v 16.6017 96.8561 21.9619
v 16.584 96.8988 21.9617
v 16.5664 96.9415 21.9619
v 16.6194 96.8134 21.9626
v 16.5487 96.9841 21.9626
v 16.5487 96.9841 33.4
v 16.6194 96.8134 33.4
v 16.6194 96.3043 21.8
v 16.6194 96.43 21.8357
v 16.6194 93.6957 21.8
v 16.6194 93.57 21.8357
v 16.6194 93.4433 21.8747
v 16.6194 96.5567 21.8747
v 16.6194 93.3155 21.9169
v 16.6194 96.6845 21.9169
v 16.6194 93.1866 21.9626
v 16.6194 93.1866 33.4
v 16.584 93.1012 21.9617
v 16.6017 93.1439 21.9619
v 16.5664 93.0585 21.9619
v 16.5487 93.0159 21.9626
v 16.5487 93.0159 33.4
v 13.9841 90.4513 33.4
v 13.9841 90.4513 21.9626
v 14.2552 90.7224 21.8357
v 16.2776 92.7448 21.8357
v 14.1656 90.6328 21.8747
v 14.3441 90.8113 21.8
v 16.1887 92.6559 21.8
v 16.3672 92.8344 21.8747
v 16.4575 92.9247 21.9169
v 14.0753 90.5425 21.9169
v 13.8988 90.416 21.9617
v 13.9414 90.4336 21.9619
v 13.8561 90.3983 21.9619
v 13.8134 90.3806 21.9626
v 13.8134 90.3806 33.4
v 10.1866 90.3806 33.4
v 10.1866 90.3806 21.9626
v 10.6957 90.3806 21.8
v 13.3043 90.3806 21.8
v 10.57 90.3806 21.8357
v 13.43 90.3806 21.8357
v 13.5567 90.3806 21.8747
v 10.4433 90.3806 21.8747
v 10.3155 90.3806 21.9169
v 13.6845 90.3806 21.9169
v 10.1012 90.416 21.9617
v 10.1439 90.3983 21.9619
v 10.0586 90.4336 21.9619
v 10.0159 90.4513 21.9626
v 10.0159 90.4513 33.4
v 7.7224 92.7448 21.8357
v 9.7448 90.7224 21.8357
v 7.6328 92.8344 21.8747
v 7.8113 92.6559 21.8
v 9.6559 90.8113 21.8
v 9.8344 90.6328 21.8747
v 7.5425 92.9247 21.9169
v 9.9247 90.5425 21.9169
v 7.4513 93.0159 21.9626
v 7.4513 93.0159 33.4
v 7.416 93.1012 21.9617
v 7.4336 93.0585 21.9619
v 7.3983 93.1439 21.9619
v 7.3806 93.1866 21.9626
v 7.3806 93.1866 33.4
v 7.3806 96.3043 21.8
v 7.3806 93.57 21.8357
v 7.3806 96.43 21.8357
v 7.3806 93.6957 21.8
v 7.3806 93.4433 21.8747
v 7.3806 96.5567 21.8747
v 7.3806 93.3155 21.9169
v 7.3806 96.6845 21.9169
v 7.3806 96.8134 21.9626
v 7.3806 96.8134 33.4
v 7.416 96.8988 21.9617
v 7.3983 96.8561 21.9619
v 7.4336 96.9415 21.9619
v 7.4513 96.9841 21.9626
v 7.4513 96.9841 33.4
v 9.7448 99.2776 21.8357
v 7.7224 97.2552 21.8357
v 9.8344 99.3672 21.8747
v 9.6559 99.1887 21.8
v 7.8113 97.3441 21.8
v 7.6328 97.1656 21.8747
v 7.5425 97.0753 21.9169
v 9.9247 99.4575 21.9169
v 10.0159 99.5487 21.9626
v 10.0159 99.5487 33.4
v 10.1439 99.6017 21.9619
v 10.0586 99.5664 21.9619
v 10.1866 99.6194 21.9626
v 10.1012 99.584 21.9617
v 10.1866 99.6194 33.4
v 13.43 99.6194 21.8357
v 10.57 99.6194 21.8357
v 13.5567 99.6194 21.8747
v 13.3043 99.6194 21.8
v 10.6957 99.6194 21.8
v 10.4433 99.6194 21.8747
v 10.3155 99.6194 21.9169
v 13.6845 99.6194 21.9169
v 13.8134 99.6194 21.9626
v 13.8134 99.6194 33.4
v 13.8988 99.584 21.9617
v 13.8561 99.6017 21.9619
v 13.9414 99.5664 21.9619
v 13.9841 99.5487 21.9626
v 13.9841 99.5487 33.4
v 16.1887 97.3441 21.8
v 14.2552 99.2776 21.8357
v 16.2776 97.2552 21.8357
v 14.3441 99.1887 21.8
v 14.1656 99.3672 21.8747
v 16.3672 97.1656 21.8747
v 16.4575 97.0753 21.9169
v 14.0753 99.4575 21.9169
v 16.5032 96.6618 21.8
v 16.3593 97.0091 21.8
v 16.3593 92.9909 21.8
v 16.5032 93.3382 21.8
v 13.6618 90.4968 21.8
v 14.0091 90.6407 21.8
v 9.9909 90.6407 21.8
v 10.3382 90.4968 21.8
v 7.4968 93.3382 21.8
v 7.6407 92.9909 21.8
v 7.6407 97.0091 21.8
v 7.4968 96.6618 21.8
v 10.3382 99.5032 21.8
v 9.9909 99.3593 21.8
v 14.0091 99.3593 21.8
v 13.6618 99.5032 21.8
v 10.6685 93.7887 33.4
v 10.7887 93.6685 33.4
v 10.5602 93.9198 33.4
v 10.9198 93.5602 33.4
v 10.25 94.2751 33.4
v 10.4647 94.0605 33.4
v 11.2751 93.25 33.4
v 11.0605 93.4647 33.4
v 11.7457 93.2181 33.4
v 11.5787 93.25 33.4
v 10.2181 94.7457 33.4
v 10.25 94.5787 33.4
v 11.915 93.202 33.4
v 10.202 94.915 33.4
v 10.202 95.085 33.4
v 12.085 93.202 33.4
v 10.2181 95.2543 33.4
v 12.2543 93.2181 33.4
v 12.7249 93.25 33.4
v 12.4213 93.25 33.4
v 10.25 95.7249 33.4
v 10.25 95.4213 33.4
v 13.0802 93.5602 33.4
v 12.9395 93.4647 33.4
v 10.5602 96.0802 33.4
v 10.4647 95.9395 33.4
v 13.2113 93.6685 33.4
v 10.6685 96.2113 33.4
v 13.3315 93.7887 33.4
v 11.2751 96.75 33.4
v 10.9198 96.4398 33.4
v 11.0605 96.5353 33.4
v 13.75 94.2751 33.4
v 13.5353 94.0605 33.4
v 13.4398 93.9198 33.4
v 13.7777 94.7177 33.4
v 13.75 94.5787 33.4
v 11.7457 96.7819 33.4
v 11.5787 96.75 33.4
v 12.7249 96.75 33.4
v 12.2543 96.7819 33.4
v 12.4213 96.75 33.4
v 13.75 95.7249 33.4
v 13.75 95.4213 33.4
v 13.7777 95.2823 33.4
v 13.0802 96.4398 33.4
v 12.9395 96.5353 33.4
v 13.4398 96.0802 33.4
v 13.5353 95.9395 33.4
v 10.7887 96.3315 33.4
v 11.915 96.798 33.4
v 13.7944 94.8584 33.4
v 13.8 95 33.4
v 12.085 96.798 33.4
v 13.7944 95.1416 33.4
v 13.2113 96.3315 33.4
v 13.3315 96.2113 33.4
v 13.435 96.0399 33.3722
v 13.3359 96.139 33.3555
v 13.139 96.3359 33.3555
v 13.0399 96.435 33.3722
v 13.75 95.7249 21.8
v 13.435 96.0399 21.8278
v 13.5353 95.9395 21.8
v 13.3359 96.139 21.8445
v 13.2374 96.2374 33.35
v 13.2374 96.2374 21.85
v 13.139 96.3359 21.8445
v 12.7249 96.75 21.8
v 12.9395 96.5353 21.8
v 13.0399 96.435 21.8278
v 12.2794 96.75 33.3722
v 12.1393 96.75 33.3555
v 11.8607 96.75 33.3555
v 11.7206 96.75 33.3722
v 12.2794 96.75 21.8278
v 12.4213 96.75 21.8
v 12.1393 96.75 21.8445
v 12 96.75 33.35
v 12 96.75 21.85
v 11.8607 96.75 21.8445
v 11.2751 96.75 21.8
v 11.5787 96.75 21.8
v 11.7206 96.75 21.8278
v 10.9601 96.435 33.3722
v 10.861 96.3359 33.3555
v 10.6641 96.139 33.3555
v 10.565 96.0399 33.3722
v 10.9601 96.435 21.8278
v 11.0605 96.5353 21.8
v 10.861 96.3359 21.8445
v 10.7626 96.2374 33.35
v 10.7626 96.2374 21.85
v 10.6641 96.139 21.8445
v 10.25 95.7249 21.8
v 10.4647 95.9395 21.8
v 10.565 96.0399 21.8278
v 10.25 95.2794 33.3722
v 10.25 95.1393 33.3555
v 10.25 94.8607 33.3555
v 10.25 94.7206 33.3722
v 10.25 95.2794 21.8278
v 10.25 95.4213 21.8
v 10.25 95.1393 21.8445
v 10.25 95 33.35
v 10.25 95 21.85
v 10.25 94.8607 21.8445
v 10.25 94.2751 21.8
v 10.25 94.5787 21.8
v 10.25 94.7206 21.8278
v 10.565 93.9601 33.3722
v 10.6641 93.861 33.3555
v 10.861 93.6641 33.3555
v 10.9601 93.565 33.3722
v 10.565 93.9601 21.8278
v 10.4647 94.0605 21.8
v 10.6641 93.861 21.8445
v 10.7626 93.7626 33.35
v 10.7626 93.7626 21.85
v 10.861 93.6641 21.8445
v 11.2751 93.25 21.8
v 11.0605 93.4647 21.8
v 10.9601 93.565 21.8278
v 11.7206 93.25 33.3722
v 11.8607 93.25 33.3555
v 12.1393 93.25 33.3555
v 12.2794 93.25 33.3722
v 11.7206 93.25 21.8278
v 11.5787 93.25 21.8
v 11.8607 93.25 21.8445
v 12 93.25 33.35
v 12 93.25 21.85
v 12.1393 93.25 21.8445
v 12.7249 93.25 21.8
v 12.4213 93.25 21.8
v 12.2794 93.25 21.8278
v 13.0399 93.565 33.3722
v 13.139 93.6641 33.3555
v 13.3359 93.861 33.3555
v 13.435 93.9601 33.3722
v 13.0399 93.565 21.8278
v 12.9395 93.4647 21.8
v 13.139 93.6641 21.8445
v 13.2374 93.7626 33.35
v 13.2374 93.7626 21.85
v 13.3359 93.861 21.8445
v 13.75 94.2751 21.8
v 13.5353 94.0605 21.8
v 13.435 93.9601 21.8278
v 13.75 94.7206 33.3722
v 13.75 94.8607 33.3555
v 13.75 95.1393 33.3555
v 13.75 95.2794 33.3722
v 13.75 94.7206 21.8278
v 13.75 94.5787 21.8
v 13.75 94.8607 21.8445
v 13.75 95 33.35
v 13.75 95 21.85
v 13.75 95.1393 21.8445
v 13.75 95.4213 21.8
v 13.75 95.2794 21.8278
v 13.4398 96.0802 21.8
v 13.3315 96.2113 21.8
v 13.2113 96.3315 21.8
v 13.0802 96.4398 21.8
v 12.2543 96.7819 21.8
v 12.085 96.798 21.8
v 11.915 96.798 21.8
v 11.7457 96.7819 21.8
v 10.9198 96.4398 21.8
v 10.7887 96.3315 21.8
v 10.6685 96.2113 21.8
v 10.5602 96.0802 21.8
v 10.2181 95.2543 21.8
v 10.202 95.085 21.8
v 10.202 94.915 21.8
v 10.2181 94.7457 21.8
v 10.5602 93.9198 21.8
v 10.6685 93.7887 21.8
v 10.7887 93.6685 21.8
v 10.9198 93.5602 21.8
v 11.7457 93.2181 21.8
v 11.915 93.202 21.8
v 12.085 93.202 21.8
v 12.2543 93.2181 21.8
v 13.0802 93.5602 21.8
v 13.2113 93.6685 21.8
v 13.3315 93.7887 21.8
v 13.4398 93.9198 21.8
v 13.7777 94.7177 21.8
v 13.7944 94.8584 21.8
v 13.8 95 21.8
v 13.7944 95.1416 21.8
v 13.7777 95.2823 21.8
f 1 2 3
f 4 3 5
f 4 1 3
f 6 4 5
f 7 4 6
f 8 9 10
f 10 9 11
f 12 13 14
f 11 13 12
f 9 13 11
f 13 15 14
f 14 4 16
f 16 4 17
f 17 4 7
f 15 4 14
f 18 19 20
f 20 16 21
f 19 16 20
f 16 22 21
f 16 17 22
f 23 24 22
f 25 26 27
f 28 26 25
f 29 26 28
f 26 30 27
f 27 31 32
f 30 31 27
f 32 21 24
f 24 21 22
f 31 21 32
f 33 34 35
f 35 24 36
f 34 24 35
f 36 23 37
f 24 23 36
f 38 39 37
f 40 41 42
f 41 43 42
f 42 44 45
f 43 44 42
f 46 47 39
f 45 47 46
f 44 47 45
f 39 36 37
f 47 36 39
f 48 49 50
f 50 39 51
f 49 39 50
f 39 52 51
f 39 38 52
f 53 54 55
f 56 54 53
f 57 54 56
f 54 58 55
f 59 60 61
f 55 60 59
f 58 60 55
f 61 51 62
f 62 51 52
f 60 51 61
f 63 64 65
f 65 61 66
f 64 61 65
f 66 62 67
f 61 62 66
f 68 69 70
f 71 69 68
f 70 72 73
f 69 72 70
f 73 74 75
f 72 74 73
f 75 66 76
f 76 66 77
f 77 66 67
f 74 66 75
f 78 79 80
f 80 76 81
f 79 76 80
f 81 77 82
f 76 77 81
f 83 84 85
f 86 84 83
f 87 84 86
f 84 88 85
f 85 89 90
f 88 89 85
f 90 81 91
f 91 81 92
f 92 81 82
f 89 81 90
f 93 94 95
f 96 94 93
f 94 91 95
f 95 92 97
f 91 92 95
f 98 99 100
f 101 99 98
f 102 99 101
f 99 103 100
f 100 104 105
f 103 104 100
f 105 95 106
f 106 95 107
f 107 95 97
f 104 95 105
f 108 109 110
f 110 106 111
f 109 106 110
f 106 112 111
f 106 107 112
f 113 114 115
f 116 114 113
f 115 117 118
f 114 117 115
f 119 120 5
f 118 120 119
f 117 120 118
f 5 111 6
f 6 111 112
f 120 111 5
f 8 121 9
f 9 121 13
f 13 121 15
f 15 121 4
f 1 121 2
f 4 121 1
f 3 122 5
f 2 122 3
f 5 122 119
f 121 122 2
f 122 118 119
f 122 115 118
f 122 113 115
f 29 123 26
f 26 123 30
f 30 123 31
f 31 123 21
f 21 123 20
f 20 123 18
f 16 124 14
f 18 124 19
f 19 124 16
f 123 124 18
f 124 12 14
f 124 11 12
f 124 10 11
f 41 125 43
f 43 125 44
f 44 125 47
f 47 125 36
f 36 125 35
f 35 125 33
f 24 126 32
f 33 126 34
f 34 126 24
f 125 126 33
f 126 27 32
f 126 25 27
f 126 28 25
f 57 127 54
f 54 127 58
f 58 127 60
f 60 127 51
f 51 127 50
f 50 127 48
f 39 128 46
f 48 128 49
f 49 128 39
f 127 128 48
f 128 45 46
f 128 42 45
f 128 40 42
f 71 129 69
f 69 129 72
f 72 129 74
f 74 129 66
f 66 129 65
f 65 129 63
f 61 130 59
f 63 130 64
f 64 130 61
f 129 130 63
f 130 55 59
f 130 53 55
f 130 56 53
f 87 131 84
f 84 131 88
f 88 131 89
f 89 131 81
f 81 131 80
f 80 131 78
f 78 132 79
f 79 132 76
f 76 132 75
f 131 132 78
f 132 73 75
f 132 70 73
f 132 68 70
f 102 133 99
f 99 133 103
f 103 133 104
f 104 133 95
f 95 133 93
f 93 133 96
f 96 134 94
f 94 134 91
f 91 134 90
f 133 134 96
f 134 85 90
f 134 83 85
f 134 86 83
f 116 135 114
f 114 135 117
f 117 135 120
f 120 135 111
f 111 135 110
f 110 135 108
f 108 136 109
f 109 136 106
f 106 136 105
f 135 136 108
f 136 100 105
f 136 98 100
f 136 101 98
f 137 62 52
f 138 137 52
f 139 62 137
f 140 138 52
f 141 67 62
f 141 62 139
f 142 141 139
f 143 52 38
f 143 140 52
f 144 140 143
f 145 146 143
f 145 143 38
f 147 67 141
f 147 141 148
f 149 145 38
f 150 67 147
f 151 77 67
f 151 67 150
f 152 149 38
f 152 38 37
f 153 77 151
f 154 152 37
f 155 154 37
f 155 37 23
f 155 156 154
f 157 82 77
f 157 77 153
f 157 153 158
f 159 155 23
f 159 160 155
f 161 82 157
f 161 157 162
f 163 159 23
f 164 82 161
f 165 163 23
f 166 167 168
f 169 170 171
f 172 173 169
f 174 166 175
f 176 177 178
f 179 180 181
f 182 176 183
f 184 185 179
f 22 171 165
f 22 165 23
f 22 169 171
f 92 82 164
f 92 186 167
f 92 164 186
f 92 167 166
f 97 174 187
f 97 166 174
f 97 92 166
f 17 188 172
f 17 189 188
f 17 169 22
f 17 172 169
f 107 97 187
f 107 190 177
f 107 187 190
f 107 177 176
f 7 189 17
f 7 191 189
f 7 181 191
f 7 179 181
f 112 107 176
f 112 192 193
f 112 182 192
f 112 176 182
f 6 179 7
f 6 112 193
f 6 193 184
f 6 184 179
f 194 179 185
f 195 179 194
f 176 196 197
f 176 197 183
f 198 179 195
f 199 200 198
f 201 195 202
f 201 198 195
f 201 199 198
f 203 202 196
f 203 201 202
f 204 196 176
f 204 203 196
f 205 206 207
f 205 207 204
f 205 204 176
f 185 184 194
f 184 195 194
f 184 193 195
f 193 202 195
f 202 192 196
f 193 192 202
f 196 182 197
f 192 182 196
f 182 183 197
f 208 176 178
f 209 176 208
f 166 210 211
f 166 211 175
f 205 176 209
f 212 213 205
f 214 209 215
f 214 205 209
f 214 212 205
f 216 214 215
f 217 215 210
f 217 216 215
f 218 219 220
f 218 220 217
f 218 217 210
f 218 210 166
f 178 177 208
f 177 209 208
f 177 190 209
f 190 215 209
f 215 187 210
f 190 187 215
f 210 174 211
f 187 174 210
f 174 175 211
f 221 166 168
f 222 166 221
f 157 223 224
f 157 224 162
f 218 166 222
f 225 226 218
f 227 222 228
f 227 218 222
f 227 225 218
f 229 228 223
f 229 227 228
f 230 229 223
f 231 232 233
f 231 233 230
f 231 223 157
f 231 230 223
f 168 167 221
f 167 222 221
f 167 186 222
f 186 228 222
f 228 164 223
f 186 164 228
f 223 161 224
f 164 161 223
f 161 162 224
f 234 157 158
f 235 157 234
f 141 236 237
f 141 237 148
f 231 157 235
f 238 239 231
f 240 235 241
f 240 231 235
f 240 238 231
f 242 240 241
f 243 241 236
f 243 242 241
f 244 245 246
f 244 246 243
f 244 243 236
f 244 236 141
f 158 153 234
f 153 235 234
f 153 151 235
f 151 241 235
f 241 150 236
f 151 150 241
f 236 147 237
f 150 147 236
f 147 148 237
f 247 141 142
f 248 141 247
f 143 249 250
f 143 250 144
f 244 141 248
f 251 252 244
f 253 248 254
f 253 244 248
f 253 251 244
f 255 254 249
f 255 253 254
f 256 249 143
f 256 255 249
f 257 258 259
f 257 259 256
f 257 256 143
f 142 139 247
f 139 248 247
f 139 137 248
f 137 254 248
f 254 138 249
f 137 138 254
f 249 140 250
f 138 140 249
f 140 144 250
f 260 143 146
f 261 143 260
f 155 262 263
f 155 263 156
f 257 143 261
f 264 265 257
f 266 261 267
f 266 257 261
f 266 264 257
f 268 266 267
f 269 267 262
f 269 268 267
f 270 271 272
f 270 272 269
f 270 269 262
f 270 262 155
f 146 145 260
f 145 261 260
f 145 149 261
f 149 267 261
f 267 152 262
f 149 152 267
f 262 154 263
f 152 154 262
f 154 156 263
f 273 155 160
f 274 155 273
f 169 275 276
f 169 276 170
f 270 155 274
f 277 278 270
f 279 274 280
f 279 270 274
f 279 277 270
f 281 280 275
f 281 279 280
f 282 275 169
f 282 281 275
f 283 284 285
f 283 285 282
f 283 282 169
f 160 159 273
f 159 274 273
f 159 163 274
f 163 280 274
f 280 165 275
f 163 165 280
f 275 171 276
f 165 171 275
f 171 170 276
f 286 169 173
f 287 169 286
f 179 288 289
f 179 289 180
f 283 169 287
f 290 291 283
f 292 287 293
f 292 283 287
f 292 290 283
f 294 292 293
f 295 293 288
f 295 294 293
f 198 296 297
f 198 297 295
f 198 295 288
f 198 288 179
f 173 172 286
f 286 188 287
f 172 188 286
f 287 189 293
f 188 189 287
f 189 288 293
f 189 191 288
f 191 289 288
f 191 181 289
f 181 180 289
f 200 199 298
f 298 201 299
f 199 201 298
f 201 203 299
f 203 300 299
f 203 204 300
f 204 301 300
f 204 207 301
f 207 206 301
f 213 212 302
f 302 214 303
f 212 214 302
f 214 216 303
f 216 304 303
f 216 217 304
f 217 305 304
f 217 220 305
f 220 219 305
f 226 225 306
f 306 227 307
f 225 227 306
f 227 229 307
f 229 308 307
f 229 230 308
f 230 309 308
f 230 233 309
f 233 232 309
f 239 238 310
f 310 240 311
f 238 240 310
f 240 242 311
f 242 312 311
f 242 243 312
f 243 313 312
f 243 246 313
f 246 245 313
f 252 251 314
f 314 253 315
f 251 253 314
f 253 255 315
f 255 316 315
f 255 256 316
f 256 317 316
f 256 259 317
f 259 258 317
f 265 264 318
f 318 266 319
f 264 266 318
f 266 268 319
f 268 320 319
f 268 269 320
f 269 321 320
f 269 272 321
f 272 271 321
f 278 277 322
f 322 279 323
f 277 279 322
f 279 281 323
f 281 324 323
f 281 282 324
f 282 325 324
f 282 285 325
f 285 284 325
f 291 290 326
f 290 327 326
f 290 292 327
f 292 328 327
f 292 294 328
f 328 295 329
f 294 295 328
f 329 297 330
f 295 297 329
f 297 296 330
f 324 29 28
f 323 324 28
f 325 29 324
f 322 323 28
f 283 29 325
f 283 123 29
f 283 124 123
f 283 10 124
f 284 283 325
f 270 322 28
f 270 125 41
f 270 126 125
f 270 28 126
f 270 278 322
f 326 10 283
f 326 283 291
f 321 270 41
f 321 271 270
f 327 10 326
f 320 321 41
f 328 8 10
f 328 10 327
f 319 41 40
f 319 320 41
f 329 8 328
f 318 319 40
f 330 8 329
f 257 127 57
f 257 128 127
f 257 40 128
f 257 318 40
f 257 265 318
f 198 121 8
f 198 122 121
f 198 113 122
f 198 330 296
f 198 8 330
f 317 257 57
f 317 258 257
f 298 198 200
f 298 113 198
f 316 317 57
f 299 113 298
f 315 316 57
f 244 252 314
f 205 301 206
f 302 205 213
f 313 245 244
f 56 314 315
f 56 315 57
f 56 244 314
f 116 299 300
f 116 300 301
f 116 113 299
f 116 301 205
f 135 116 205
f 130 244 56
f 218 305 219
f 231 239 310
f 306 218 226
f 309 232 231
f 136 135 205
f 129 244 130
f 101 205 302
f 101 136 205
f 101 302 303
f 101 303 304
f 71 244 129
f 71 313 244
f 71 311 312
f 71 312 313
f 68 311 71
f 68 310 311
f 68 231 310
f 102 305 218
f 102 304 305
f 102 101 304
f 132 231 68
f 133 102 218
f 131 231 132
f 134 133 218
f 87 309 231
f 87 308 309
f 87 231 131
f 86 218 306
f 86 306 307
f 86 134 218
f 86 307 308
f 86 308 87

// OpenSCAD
// Generated by the canonical parent Python sources and validated exchange pipeline.
polyhedron(points=[[16.60171890258789, 96.85609436035156, 21.961946487426758], [16.584041595458984, 96.89877319335938, 21.96173095703125], [16.56636619567871, 96.94145202636719, 21.961946487426758], [16.61939811706543, 96.81341552734375, 21.96259117126465], [16.548686981201172, 96.984130859375, 21.96259117126465], [16.548686981201172, 96.984130859375, 33.400001525878906], [16.61939811706543, 96.81341552734375, 33.400001525878906], [16.61939811706543, 96.30429077148438, 21.799999237060547], [16.61939811706543, 96.43002319335938, 21.83568000793457], [16.61939811706543, 93.69570922851562, 21.799999237060547], [16.61939811706543, 93.56997680664062, 21.83568000793457], [16.61939811706543, 93.44326782226562, 21.874652862548828], [16.61939811706543, 96.55673217773438, 21.874652862548828], [16.61939811706543, 93.31549835205078, 21.916948318481445], [16.61939811706543, 96.68450164794922, 21.916948318481445], [16.61939811706543, 93.18658447265625, 21.96259117126465], [16.61939811706543, 93.18658447265625, 33.400001525878906], [16.584041595458984, 93.10122680664062, 21.96173095703125], [16.60171890258789, 93.14390563964844, 21.961946487426758], [16.56636619567871, 93.05854797363281, 21.961946487426758], [16.548686981201172, 93.015869140625, 21.96259117126465], [16.548686981201172, 93.015869140625, 33.400001525878906], [13.98412799835205, 90.45130920410156, 33.400001525878906], [13.98412799835205, 90.45130920410156, 21.96259117126465], [14.255228996276855, 90.722412109375, 21.83568000793457], [16.277585983276367, 92.7447738647461, 21.83568000793457], [14.165632247924805, 90.63282012939453, 21.874652862548828], [14.344137191772461, 90.81132507324219, 21.799999237060547], [16.188676834106445, 92.6558609008789, 21.799999237060547], [16.3671817779541, 92.83436584472656, 21.874652862548828], [16.457529067993164, 92.92471313476562, 21.916948318481445], [14.075285911560059, 90.54247283935547, 21.916948318481445], [13.898772239685059, 90.41595458984375, 21.96173095703125], [13.941448211669922, 90.43363189697266, 21.961946487426758], [13.856096267700195, 90.39827728271484, 21.961946487426758], [13.813417434692383, 90.38059997558594, 21.96259117126465], [13.813417434692383, 90.38059997558594, 33.400001525878906], [10.186582565307617, 90.38059997558594, 33.400001525878906], [10.186582565307617, 90.38059997558594, 21.96259117126465], [10.69571304321289, 90.38059997558594, 21.799999237060547], [13.30428695678711, 90.38059997558594, 21.799999237060547], [10.569977760314941, 90.38059997558594, 21.83568000793457], [13.430022239685059, 90.38059997558594, 21.83568000793457], [13.556731224060059, 90.38059997558594, 21.874652862548828], [10.443268775939941, 90.38059997558594, 21.874652862548828], [10.315499305725098, 90.38059997558594, 21.916948318481445], [13.684500694274902, 90.38059997558594, 21.916948318481445], [10.101227760314941, 90.41595458984375, 21.96173095703125], [10.143903732299805, 90.39827728271484, 21.961946487426758], [10.058551788330078, 90.43363189697266, 21.961946487426758], [10.01587200164795, 90.45130920410156, 21.96259117126465], [10.01587200164795, 90.45130920410156, 33.400001525878906], [7.722414493560791, 92.7447738647461, 21.83568000793457], [9.744771003723145, 90.722412109375, 21.83568000793457], [7.63281774520874, 92.83436584472656, 21.874652862548828], [7.811322212219238, 92.6558609008789, 21.799999237060547], [9.655862808227539, 90.81132507324219, 21.799999237060547], [9.834367752075195, 90.63282012939453, 21.874652862548828], [7.542470932006836, 92.92471313476562, 21.916948318481445], [9.924714088439941, 90.54247283935547, 21.916948318481445], [7.451313018798828, 93.015869140625, 21.96259117126465], [7.451313018798828, 93.015869140625, 33.400001525878906], [7.415957450866699, 93.10122680664062, 21.96173095703125], [7.4336347579956055, 93.05854797363281, 21.961946487426758], [7.398280620574951, 93.14390563964844, 21.961946487426758], [7.3806023597717285, 93.18658447265625, 21.96259117126465], [7.3806023597717285, 93.18658447265625, 33.400001525878906], [7.3806023597717285, 96.30429077148438, 21.799999237060547], [7.3806023597717285, 93.56997680664062, 21.83568000793457], [7.3806023597717285, 96.43002319335938, 21.83568000793457], [7.3806023597717285, 93.69570922851562, 21.799999237060547], [7.3806023597717285, 93.44326782226562, 21.874652862548828], [7.3806023597717285, 96.55673217773438, 21.874652862548828], [7.3806023597717285, 93.31549835205078, 21.916948318481445], [7.3806023597717285, 96.68450164794922, 21.916948318481445], [7.3806023597717285, 96.81341552734375, 21.96259117126465], [7.3806023597717285, 96.81341552734375, 33.400001525878906], [7.415957450866699, 96.89877319335938, 21.96173095703125], [7.398280620574951, 96.85609436035156, 21.961946487426758], [7.4336347579956055, 96.94145202636719, 21.961946487426758], [7.451313018798828, 96.984130859375, 21.96259117126465], [7.451313018798828, 96.984130859375, 33.400001525878906], [9.744771003723145, 99.277587890625, 21.83568000793457], [7.722414493560791, 97.2552261352539, 21.83568000793457], [9.834367752075195, 99.36717987060547, 21.874652862548828], [9.655862808227539, 99.18867492675781, 21.799999237060547], [7.811322212219238, 97.3441390991211, 21.799999237060547], [7.63281774520874, 97.16563415527344, 21.874652862548828], [7.542470932006836, 97.07528686523438, 21.916948318481445], [9.924714088439941, 99.45752716064453, 21.916948318481445], [10.01587200164795, 99.54869079589844, 21.96259117126465], [10.01587200164795, 99.54869079589844, 33.400001525878906], [10.143903732299805, 99.60172271728516, 21.961946487426758], [10.058551788330078, 99.56636810302734, 21.961946487426758], [10.186582565307617, 99.61940002441406, 21.96259117126465], [10.101227760314941, 99.58404541015625, 21.96173095703125], [10.186582565307617, 99.61940002441406, 33.400001525878906], [13.430022239685059, 99.61940002441406, 21.83568000793457], [10.569977760314941, 99.61940002441406, 21.83568000793457], [13.556731224060059, 99.61940002441406, 21.874652862548828], [13.30428695678711, 99.61940002441406, 21.799999237060547], [10.69571304321289, 99.61940002441406, 21.799999237060547], [10.443268775939941, 99.61940002441406, 21.874652862548828], [10.315499305725098, 99.61940002441406, 21.916948318481445], [13.684500694274902, 99.61940002441406, 21.916948318481445], [13.813417434692383, 99.61940002441406, 21.96259117126465], [13.813417434692383, 99.61940002441406, 33.400001525878906], [13.898772239685059, 99.58404541015625, 21.96173095703125], [13.856096267700195, 99.60172271728516, 21.961946487426758], [13.941448211669922, 99.56636810302734, 21.961946487426758], [13.98412799835205, 99.54869079589844, 21.96259117126465], [13.98412799835205, 99.54869079589844, 33.400001525878906], [16.188676834106445, 97.3441390991211, 21.799999237060547], [14.255228996276855, 99.277587890625, 21.83568000793457], [16.277585983276367, 97.2552261352539, 21.83568000793457], [14.344137191772461, 99.18867492675781, 21.799999237060547], [14.165632247924805, 99.36717987060547, 21.874652862548828], [16.3671817779541, 97.16563415527344, 21.874652862548828], [16.457529067993164, 97.07528686523438, 21.916948318481445], [14.075285911560059, 99.45752716064453, 21.916948318481445], [16.50315284729004, 96.66181182861328, 21.799999237060547], [16.35928726196289, 97.0091323852539, 21.799999237060547], [16.35928726196289, 92.9908676147461, 21.799999237060547], [16.50315284729004, 93.33818817138672, 21.799999237060547], [13.661808013916016, 90.4968490600586, 21.799999237060547], [14.009135246276855, 90.64071655273438, 21.799999237060547], [9.990864753723145, 90.64071655273438, 21.799999237060547], [10.338191986083984, 90.4968490600586, 21.799999237060547], [7.4968461990356445, 93.33818817138672, 21.799999237060547], [7.640713691711426, 92.9908676147461, 21.799999237060547], [7.640713691711426, 97.0091323852539, 21.799999237060547], [7.4968461990356445, 96.66181182861328, 21.799999237060547], [10.338191986083984, 99.5031509399414, 21.799999237060547], [9.990864753723145, 99.35928344726562, 21.799999237060547], [14.009135246276855, 99.35928344726562, 21.799999237060547], [13.661808013916016, 99.5031509399414, 21.799999237060547], [10.668511390686035, 93.78874206542969, 33.400001525878906], [10.788745880126953, 93.66851043701172, 33.400001525878906], [10.560157775878906, 93.91979217529297, 33.400001525878906], [10.91978931427002, 93.5601577758789, 33.400001525878906], [10.25, 94.2751235961914, 33.400001525878906], [10.464653968811035, 94.06047058105469, 33.400001525878906], [11.275126457214355, 93.25, 33.400001525878906], [11.06047248840332, 93.46465301513672, 33.400001525878906], [11.745701789855957, 93.21805572509766, 33.400001525878906], [11.578692436218262, 93.25, 33.400001525878906], [10.218053817749023, 94.7457046508789, 33.400001525878906], [10.25, 94.57868957519531, 33.400001525878906], [11.9149808883667, 93.20201110839844, 33.400001525878906], [10.202009201049805, 94.91497802734375, 33.400001525878906], [10.202009201049805, 95.08502197265625, 33.400001525878906], [12.0850191116333, 93.20201110839844, 33.400001525878906], [10.218053817749023, 95.2542953491211, 33.400001525878906], [12.254298210144043, 93.21805572509766, 33.400001525878906], [12.724873542785645, 93.25, 33.400001525878906], [12.421307563781738, 93.25, 33.400001525878906], [10.25, 95.7248764038086, 33.400001525878906], [10.25, 95.42131042480469, 33.400001525878906], [13.08021068572998, 93.5601577758789, 33.400001525878906], [12.93952751159668, 93.46465301513672, 33.400001525878906], [10.560157775878906, 96.08020782470703, 33.400001525878906], [10.464653968811035, 95.93952941894531, 33.400001525878906], [13.211254119873047, 93.66851043701172, 33.400001525878906], [10.668511390686035, 96.21125793457031, 33.400001525878906], [13.331488609313965, 93.78874206542969, 33.400001525878906], [11.275126457214355, 96.75, 33.400001525878906], [10.91978931427002, 96.4398422241211, 33.400001525878906], [11.06047248840332, 96.53534698486328, 33.400001525878906], [13.75, 94.2751235961914, 33.400001525878906], [13.535346031188965, 94.06047058105469, 33.400001525878906], [13.439842224121094, 93.91979217529297, 33.400001525878906], [13.77772045135498, 94.71766662597656, 33.400001525878906], [13.75, 94.57868957519531, 33.400001525878906], [11.745701789855957, 96.78194427490234, 33.400001525878906], [11.578692436218262, 96.75, 33.400001525878906], [12.724873542785645, 96.75, 33.400001525878906], [12.254298210144043, 96.78194427490234, 33.400001525878906], [12.421307563781738, 96.75, 33.400001525878906], [13.75, 95.7248764038086, 33.400001525878906], [13.75, 95.42131042480469, 33.400001525878906], [13.77772045135498, 95.28233337402344, 33.400001525878906], [13.08021068572998, 96.4398422241211, 33.400001525878906], [12.93952751159668, 96.53534698486328, 33.400001525878906], [13.439842224121094, 96.08020782470703, 33.400001525878906], [13.535346031188965, 95.93952941894531, 33.400001525878906], [10.788745880126953, 96.33148956298828, 33.400001525878906], [11.9149808883667, 96.79798889160156, 33.400001525878906], [13.794421195983887, 94.8583984375, 33.400001525878906], [13.800000190734863, 95.0, 33.400001525878906], [12.0850191116333, 96.79798889160156, 33.400001525878906], [13.794421195983887, 95.1416015625, 33.400001525878906], [13.211254119873047, 96.33148956298828, 33.400001525878906], [13.331488609313965, 96.21125793457031, 33.400001525878906], [13.435003280639648, 96.03987121582031, 33.37216567993164], [13.335908889770508, 96.13896179199219, 33.355533599853516], [13.138965606689453, 96.33590698242188, 33.355533599853516], [13.039871215820312, 96.43500518798828, 33.37216567993164], [13.75, 95.7248764038086, 21.799999237060547], [13.435003280639648, 96.03987121582031, 21.827836990356445], [13.535346031188965, 95.93952941894531, 21.799999237060547], [13.335908889770508, 96.13896179199219, 21.844467163085938], [13.23743724822998, 96.23743438720703, 33.349998474121094], [13.23743724822998, 96.23743438720703, 21.850000381469727], [13.138965606689453, 96.33590698242188, 21.844467163085938], [12.724873542785645, 96.75, 21.799999237060547], [12.93952751159668, 96.53534698486328, 21.799999237060547], [13.039871215820312, 96.43500518798828, 21.827836990356445], [12.279400825500488, 96.75, 33.37216567993164], [12.139260292053223, 96.75, 33.355533599853516], [11.860739707946777, 96.75, 33.355533599853516], [11.720599174499512, 96.75, 33.37216567993164], [12.279400825500488, 96.75, 21.827836990356445], [12.421307563781738, 96.75, 21.799999237060547], [12.139260292053223, 96.75, 21.844467163085938], [12.0, 96.75, 33.349998474121094], [12.0, 96.75, 21.850000381469727], [11.860739707946777, 96.75, 21.844467163085938], [11.275126457214355, 96.75, 21.799999237060547], [11.578692436218262, 96.75, 21.799999237060547], [11.720599174499512, 96.75, 21.827836990356445], [10.960128784179688, 96.43500518798828, 33.37216567993164], [10.861034393310547, 96.33590698242188, 33.355533599853516], [10.664091110229492, 96.13896179199219, 33.355533599853516], [10.564996719360352, 96.03987121582031, 33.37216567993164], [10.960128784179688, 96.43500518798828, 21.827836990356445], [11.06047248840332, 96.53534698486328, 21.799999237060547], [10.861034393310547, 96.33590698242188, 21.844467163085938], [10.76256275177002, 96.23743438720703, 33.349998474121094], [10.76256275177002, 96.23743438720703, 21.850000381469727], [10.664091110229492, 96.13896179199219, 21.844467163085938], [10.25, 95.7248764038086, 21.799999237060547], [10.464653968811035, 95.93952941894531, 21.799999237060547], [10.564996719360352, 96.03987121582031, 21.827836990356445], [10.25, 95.27940368652344, 33.37216567993164], [10.25, 95.1392593383789, 33.355533599853516], [10.25, 94.8607406616211, 33.355533599853516], [10.25, 94.72059631347656, 33.37216567993164], [10.25, 95.27940368652344, 21.827836990356445], [10.25, 95.42131042480469, 21.799999237060547], [10.25, 95.1392593383789, 21.844467163085938], [10.25, 95.0, 33.349998474121094], [10.25, 95.0, 21.850000381469727], [10.25, 94.8607406616211, 21.844467163085938], [10.25, 94.2751235961914, 21.799999237060547], [10.25, 94.57868957519531, 21.799999237060547], [10.25, 94.72059631347656, 21.827836990356445], [10.564996719360352, 93.96012878417969, 33.37216567993164], [10.664091110229492, 93.86103820800781, 33.355533599853516], [10.861034393310547, 93.66409301757812, 33.355533599853516], [10.960128784179688, 93.56499481201172, 33.37216567993164], [10.564996719360352, 93.96012878417969, 21.827836990356445], [10.464653968811035, 94.06047058105469, 21.799999237060547], [10.664091110229492, 93.86103820800781, 21.844467163085938], [10.76256275177002, 93.76256561279297, 33.349998474121094], [10.76256275177002, 93.76256561279297, 21.850000381469727], [10.861034393310547, 93.66409301757812, 21.844467163085938], [11.275126457214355, 93.25, 21.799999237060547], [11.06047248840332, 93.46465301513672, 21.799999237060547], [10.960128784179688, 93.56499481201172, 21.827836990356445], [11.720599174499512, 93.25, 33.37216567993164], [11.860739707946777, 93.25, 33.355533599853516], [12.139260292053223, 93.25, 33.355533599853516], [12.279400825500488, 93.25, 33.37216567993164], [11.720599174499512, 93.25, 21.827836990356445], [11.578692436218262, 93.25, 21.799999237060547], [11.860739707946777, 93.25, 21.844467163085938], [12.0, 93.25, 33.349998474121094], [12.0, 93.25, 21.850000381469727], [12.139260292053223, 93.25, 21.844467163085938], [12.724873542785645, 93.25, 21.799999237060547], [12.421307563781738, 93.25, 21.799999237060547], [12.279400825500488, 93.25, 21.827836990356445], [13.039871215820312, 93.56499481201172, 33.37216567993164], [13.138964653015137, 93.66409301757812, 33.355533599853516], [13.335908889770508, 93.86103820800781, 33.355533599853516], [13.435003280639648, 93.96012878417969, 33.37216567993164], [13.039871215820312, 93.56499481201172, 21.827836990356445], [12.93952751159668, 93.46465301513672, 21.799999237060547], [13.138965606689453, 93.66409301757812, 21.844467163085938], [13.23743724822998, 93.76256561279297, 33.349998474121094], [13.23743724822998, 93.76256561279297, 21.850000381469727], [13.335908889770508, 93.86103820800781, 21.844467163085938], [13.75, 94.2751235961914, 21.799999237060547], [13.535346031188965, 94.06047058105469, 21.799999237060547], [13.435003280639648, 93.96012878417969, 21.827836990356445], [13.75, 94.72059631347656, 33.37216567993164], [13.75, 94.8607406616211, 33.355533599853516], [13.75, 95.1392593383789, 33.355533599853516], [13.75, 95.27940368652344, 33.37216567993164], [13.75, 94.72059631347656, 21.827836990356445], [13.75, 94.57868957519531, 21.799999237060547], [13.75, 94.8607406616211, 21.844467163085938], [13.75, 95.0, 33.349998474121094], [13.75, 95.0, 21.850000381469727], [13.75, 95.1392593383789, 21.844467163085938], [13.75, 95.42131042480469, 21.799999237060547], [13.75, 95.27940368652344, 21.827836990356445], [13.439842224121094, 96.08020782470703, 21.799999237060547], [13.331488609313965, 96.21125793457031, 21.799999237060547], [13.211254119873047, 96.33148956298828, 21.799999237060547], [13.08021068572998, 96.4398422241211, 21.799999237060547], [12.254298210144043, 96.78194427490234, 21.799999237060547], [12.0850191116333, 96.79798889160156, 21.799999237060547], [11.9149808883667, 96.79798889160156, 21.799999237060547], [11.745701789855957, 96.78194427490234, 21.799999237060547], [10.91978931427002, 96.4398422241211, 21.799999237060547], [10.788745880126953, 96.33148956298828, 21.799999237060547], [10.668511390686035, 96.21125793457031, 21.799999237060547], [10.560157775878906, 96.08020782470703, 21.799999237060547], [10.218053817749023, 95.2542953491211, 21.799999237060547], [10.202009201049805, 95.08502197265625, 21.799999237060547], [10.202009201049805, 94.91497802734375, 21.799999237060547], [10.218053817749023, 94.7457046508789, 21.799999237060547], [10.560157775878906, 93.91979217529297, 21.799999237060547], [10.668511390686035, 93.78874206542969, 21.799999237060547], [10.788745880126953, 93.66851043701172, 21.799999237060547], [10.91978931427002, 93.5601577758789, 21.799999237060547], [11.745701789855957, 93.21805572509766, 21.799999237060547], [11.9149808883667, 93.20201110839844, 21.799999237060547], [12.0850191116333, 93.20201110839844, 21.799999237060547], [12.254298210144043, 93.21805572509766, 21.799999237060547], [13.08021068572998, 93.5601577758789, 21.799999237060547], [13.211254119873047, 93.66851043701172, 21.799999237060547], [13.331488609313965, 93.78874206542969, 21.799999237060547], [13.439842224121094, 93.91979217529297, 21.799999237060547], [13.77772045135498, 94.71766662597656, 21.799999237060547], [13.794421195983887, 94.8583984375, 21.799999237060547], [13.800000190734863, 95.0, 21.799999237060547], [13.794421195983887, 95.1416015625, 21.799999237060547], [13.77772045135498, 95.28233337402344, 21.799999237060547]],faces=[[2, 1, 0], [4, 2, 3], [2, 0, 3], [4, 3, 5], [5, 3, 6], [9, 8, 7], [10, 8, 9], [13, 12, 11], [11, 12, 10], [10, 12, 8], [13, 14, 12], [15, 3, 13], [16, 3, 15], [6, 3, 16], [13, 3, 14], [19, 18, 17], [20, 15, 19], [19, 15, 18], [20, 21, 15], [21, 16, 15], [21, 23, 22], [26, 25, 24], [24, 25, 27], [27, 25, 28], [26, 29, 25], [31, 30, 26], [26, 30, 29], [23, 20, 31], [21, 20, 23], [31, 20, 30], [34, 33, 32], [35, 23, 34], [34, 23, 33], [36, 22, 35], [35, 22, 23], [36, 38, 37], [41, 40, 39], [41, 42, 40], [44, 43, 41], [41, 43, 42], [38, 46, 45], [45, 46, 44], [44, 46, 43], [36, 35, 38], [38, 35, 46], [49, 48, 47], [50, 38, 49], [49, 38, 48], [50, 51, 38], [51, 37, 38], [54, 53, 52], [52, 53, 55], [55, 53, 56], [54, 57, 53], [60, 59, 58], [58, 59, 54], [54, 59, 57], [61, 50, 60], [51, 50, 61], [60, 50, 59], [64, 63, 62], [65, 60, 64], [64, 60, 63], [66, 61, 65], [65, 61, 60], [69, 68, 67], [67, 68, 70], [72, 71, 69], [69, 71, 68], [74, 73, 72], [72, 73, 71], [75, 65, 74], [76, 65, 75], [66, 65, 76], [74, 65, 73], [79, 78, 77], [80, 75, 79], [79, 75, 78], [81, 76, 80], [80, 76, 75], [84, 83, 82], [82, 83, 85], [85, 83, 86], [84, 87, 83], [89, 88, 84], [84, 88, 87], [90, 80, 89], [91, 80, 90], [81, 80, 91], [89, 80, 88], [94, 93, 92], [92, 93, 95], [94, 90, 93], [96, 91, 94], [94, 91, 90], [99, 98, 97], [97, 98, 100], [100, 98, 101], [99, 102, 98], [104, 103, 99], [99, 103, 102], [105, 94, 104], [106, 94, 105], [96, 94, 106], [104, 94, 103], [109, 108, 107], [110, 105, 109], [109, 105, 108], [110, 111, 105], [111, 106, 105], [114, 113, 112], [112, 113, 115], [117, 116, 114], [114, 116, 113], [4, 119, 118], [118, 119, 117], [117, 119, 116], [5, 110, 4], [111, 110, 5], [4, 110, 119], [8, 120, 7], [12, 120, 8], [14, 120, 12], [3, 120, 14], [1, 120, 0], [0, 120, 3], [4, 121, 2], [2, 121, 1], [118, 121, 4], [1, 121, 120], [118, 117, 121], [117, 114, 121], [114, 112, 121], [25, 122, 28], [29, 122, 25], [30, 122, 29], [20, 122, 30], [19, 122, 20], [17, 122, 19], [13, 123, 15], [18, 123, 17], [15, 123, 18], [17, 123, 122], [13, 11, 123], [11, 10, 123], [10, 9, 123], [42, 124, 40], [43, 124, 42], [46, 124, 43], [35, 124, 46], [34, 124, 35], [32, 124, 34], [31, 125, 23], [33, 125, 32], [23, 125, 33], [32, 125, 124], [31, 26, 125], [26, 24, 125], [24, 27, 125], [53, 126, 56], [57, 126, 53], [59, 126, 57], [50, 126, 59], [49, 126, 50], [47, 126, 49], [45, 127, 38], [48, 127, 47], [38, 127, 48], [47, 127, 126], [45, 44, 127], [44, 41, 127], [41, 39, 127], [68, 128, 70], [71, 128, 68], [73, 128, 71], [65, 128, 73], [64, 128, 65], [62, 128, 64], [58, 129, 60], [63, 129, 62], [60, 129, 63], [62, 129, 128], [58, 54, 129], [54, 52, 129], [52, 55, 129], [83, 130, 86], [87, 130, 83], [88, 130, 87], [80, 130, 88], [79, 130, 80], [77, 130, 79], [78, 131, 77], [75, 131, 78], [74, 131, 75], [77, 131, 130], [74, 72, 131], [72, 69, 131], [69, 67, 131], [98, 132, 101], [102, 132, 98], [103, 132, 102], [94, 132, 103], [92, 132, 94], [95, 132, 92], [93, 133, 95], [90, 133, 93], [89, 133, 90], [95, 133, 132], [89, 84, 133], [84, 82, 133], [82, 85, 133], [113, 134, 115], [116, 134, 113], [119, 134, 116], [110, 134, 119], [109, 134, 110], [107, 134, 109], [108, 135, 107], [105, 135, 108], [104, 135, 105], [107, 135, 134], [104, 99, 135], [99, 97, 135], [97, 100, 135], [51, 61, 136], [51, 136, 137], [136, 61, 138], [51, 137, 139], [61, 66, 140], [138, 61, 140], [138, 140, 141], [37, 51, 142], [51, 139, 142], [142, 139, 143], [142, 145, 144], [37, 142, 144], [140, 66, 146], [147, 140, 146], [37, 144, 148], [146, 66, 149], [66, 76, 150], [149, 66, 150], [37, 148, 151], [36, 37, 151], [150, 76, 152], [36, 151, 153], [36, 153, 154], [22, 36, 154], [153, 155, 154], [76, 81, 156], [152, 76, 156], [157, 152, 156], [22, 154, 158], [154, 159, 158], [156, 81, 160], [161, 156, 160], [22, 158, 162], [160, 81, 163], [22, 162, 164], [167, 166, 165], [170, 169, 168], [168, 172, 171], [174, 165, 173], [177, 176, 175], [180, 179, 178], [182, 175, 181], [178, 184, 183], [164, 170, 21], [22, 164, 21], [170, 168, 21], [163, 81, 91], [166, 185, 91], [185, 163, 91], [165, 166, 91], [186, 173, 96], [173, 165, 96], [165, 91, 96], [171, 187, 16], [187, 188, 16], [21, 168, 16], [168, 171, 16], [186, 96, 106], [176, 189, 106], [189, 186, 106], [175, 176, 106], [16, 188, 6], [188, 190, 6], [190, 180, 6], [180, 178, 6], [175, 106, 111], [192, 191, 111], [191, 181, 111], [181, 175, 111], [6, 178, 5], [192, 111, 5], [183, 192, 5], [178, 183, 5], [184, 178, 193], [193, 178, 194], [196, 195, 175], [182, 196, 175], [194, 178, 197], [197, 199, 198], [201, 194, 200], [194, 197, 200], [197, 198, 200], [195, 201, 202], [201, 200, 202], [175, 195, 203], [195, 202, 203], [206, 205, 204], [203, 206, 204], [175, 203, 204], [193, 183, 184], [193, 194, 183], [194, 192, 183], [194, 201, 192], [195, 191, 201], [201, 191, 192], [196, 181, 195], [195, 181, 191], [196, 182, 181], [177, 175, 207], [207, 175, 208], [210, 209, 165], [174, 210, 165], [208, 175, 204], [204, 212, 211], [214, 208, 213], [208, 204, 213], [204, 211, 213], [214, 213, 215], [209, 214, 216], [214, 215, 216], [219, 218, 217], [216, 219, 217], [209, 216, 217], [165, 209, 217], [207, 176, 177], [207, 208, 176], [208, 189, 176], [208, 214, 189], [209, 186, 214], [214, 186, 189], [210, 173, 209], [209, 173, 186], [210, 174, 173], [167, 165, 220], [220, 165, 221], [223, 222, 156], [161, 223, 156], [221, 165, 217], [217, 225, 224], [227, 221, 226], [221, 217, 226], [217, 224, 226], [222, 227, 228], [227, 226, 228], [222, 228, 229], [232, 231, 230], [229, 232, 230], [156, 222, 230], [222, 229, 230], [220, 166, 167], [220, 221, 166], [221, 185, 166], [221, 227, 185], [222, 163, 227], [227, 163, 185], [223, 160, 222], [222, 160, 163], [223, 161, 160], [157, 156, 233], [233, 156, 234], [236, 235, 140], [147, 236, 140], [234, 156, 230], [230, 238, 237], [240, 234, 239], [234, 230, 239], [230, 237, 239], [240, 239, 241], [235, 240, 242], [240, 241, 242], [245, 244, 243], [242, 245, 243], [235, 242, 243], [140, 235, 243], [233, 152, 157], [233, 234, 152], [234, 150, 152], [234, 240, 150], [235, 149, 240], [240, 149, 150], [236, 146, 235], [235, 146, 149], [236, 147, 146], [141, 140, 246], [246, 140, 247], [249, 248, 142], [143, 249, 142], [247, 140, 243], [243, 251, 250], [253, 247, 252], [247, 243, 252], [243, 250, 252], [248, 253, 254], [253, 252, 254], [142, 248, 255], [248, 254, 255], [258, 257, 256], [255, 258, 256], [142, 255, 256], [246, 138, 141], [246, 247, 138], [247, 136, 138], [247, 253, 136], [248, 137, 253], [253, 137, 136], [249, 139, 248], [248, 139, 137], [249, 143, 139], [145, 142, 259], [259, 142, 260], [262, 261, 154], [155, 262, 154], [260, 142, 256], [256, 264, 263], [266, 260, 265], [260, 256, 265], [256, 263, 265], [266, 265, 267], [261, 266, 268], [266, 267, 268], [271, 270, 269], [268, 271, 269], [261, 268, 269], [154, 261, 269], [259, 144, 145], [259, 260, 144], [260, 148, 144], [260, 266, 148], [261, 151, 266], [266, 151, 148], [262, 153, 261], [261, 153, 151], [262, 155, 153], [159, 154, 272], [272, 154, 273], [275, 274, 168], [169, 275, 168], [273, 154, 269], [269, 277, 276], [279, 273, 278], [273, 269, 278], [269, 276, 278], [274, 279, 280], [279, 278, 280], [168, 274, 281], [274, 280, 281], [284, 283, 282], [281, 284, 282], [168, 281, 282], [272, 158, 159], [272, 273, 158], [273, 162, 158], [273, 279, 162], [274, 164, 279], [279, 164, 162], [275, 170, 274], [274, 170, 164], [275, 169, 170], [172, 168, 285], [285, 168, 286], [288, 287, 178], [179, 288, 178], [286, 168, 282], [282, 290, 289], [292, 286, 291], [286, 282, 291], [282, 289, 291], [292, 291, 293], [287, 292, 294], [292, 293, 294], [296, 295, 197], [294, 296, 197], [287, 294, 197], [178, 287, 197], [285, 171, 172], [286, 187, 285], [285, 187, 171], [292, 188, 286], [286, 188, 187], [292, 287, 188], [287, 190, 188], [287, 288, 190], [288, 180, 190], [288, 179, 180], [297, 198, 199], [298, 200, 297], [297, 200, 198], [298, 202, 200], [298, 299, 202], [299, 203, 202], [299, 300, 203], [300, 206, 203], [300, 205, 206], [301, 211, 212], [302, 213, 301], [301, 213, 211], [302, 215, 213], [302, 303, 215], [303, 216, 215], [303, 304, 216], [304, 219, 216], [304, 218, 219], [305, 224, 225], [306, 226, 305], [305, 226, 224], [306, 228, 226], [306, 307, 228], [307, 229, 228], [307, 308, 229], [308, 232, 229], [308, 231, 232], [309, 237, 238], [310, 239, 309], [309, 239, 237], [310, 241, 239], [310, 311, 241], [311, 242, 241], [311, 312, 242], [312, 245, 242], [312, 244, 245], [313, 250, 251], [314, 252, 313], [313, 252, 250], [314, 254, 252], [314, 315, 254], [315, 255, 254], [315, 316, 255], [316, 258, 255], [316, 257, 258], [317, 263, 264], [318, 265, 317], [317, 265, 263], [318, 267, 265], [318, 319, 267], [319, 268, 267], [319, 320, 268], [320, 271, 268], [320, 270, 271], [321, 276, 277], [322, 278, 321], [321, 278, 276], [322, 280, 278], [322, 323, 280], [323, 281, 280], [323, 324, 281], [324, 284, 281], [324, 283, 284], [325, 289, 290], [325, 326, 289], [326, 291, 289], [326, 327, 291], [327, 293, 291], [328, 294, 327], [327, 294, 293], [329, 296, 328], [328, 296, 294], [329, 295, 296], [27, 28, 323], [27, 323, 322], [323, 28, 324], [27, 322, 321], [324, 28, 282], [28, 122, 282], [122, 123, 282], [123, 9, 282], [324, 282, 283], [27, 321, 269], [40, 124, 269], [124, 125, 269], [125, 27, 269], [321, 277, 269], [282, 9, 325], [290, 282, 325], [40, 269, 320], [269, 270, 320], [325, 9, 326], [40, 320, 319], [9, 7, 327], [326, 9, 327], [39, 40, 318], [40, 319, 318], [327, 7, 328], [39, 318, 317], [328, 7, 329], [56, 126, 256], [126, 127, 256], [127, 39, 256], [39, 317, 256], [317, 264, 256], [7, 120, 197], [120, 121, 197], [121, 112, 197], [295, 329, 197], [329, 7, 197], [56, 256, 316], [256, 257, 316], [199, 197, 297], [197, 112, 297], [56, 316, 315], [297, 112, 298], [56, 315, 314], [313, 251, 243], [205, 300, 204], [212, 204, 301], [243, 244, 312], [314, 313, 55], [56, 314, 55], [313, 243, 55], [299, 298, 115], [300, 299, 115], [298, 112, 115], [204, 300, 115], [204, 115, 134], [55, 243, 129], [218, 304, 217], [309, 238, 230], [225, 217, 305], [230, 231, 308], [204, 134, 135], [129, 243, 128], [301, 204, 100], [204, 135, 100], [302, 301, 100], [303, 302, 100], [128, 243, 70], [243, 312, 70], [311, 310, 70], [312, 311, 70], [70, 310, 67], [310, 309, 67], [309, 230, 67], [217, 304, 101], [304, 303, 101], [303, 100, 101], [67, 230, 131], [217, 101, 132], [131, 230, 130], [217, 132, 133], [230, 308, 86], [308, 307, 86], [130, 230, 86], [305, 217, 85], [306, 305, 85], [217, 133, 85], [307, 306, 85], [86, 307, 85]],convexity=10);
